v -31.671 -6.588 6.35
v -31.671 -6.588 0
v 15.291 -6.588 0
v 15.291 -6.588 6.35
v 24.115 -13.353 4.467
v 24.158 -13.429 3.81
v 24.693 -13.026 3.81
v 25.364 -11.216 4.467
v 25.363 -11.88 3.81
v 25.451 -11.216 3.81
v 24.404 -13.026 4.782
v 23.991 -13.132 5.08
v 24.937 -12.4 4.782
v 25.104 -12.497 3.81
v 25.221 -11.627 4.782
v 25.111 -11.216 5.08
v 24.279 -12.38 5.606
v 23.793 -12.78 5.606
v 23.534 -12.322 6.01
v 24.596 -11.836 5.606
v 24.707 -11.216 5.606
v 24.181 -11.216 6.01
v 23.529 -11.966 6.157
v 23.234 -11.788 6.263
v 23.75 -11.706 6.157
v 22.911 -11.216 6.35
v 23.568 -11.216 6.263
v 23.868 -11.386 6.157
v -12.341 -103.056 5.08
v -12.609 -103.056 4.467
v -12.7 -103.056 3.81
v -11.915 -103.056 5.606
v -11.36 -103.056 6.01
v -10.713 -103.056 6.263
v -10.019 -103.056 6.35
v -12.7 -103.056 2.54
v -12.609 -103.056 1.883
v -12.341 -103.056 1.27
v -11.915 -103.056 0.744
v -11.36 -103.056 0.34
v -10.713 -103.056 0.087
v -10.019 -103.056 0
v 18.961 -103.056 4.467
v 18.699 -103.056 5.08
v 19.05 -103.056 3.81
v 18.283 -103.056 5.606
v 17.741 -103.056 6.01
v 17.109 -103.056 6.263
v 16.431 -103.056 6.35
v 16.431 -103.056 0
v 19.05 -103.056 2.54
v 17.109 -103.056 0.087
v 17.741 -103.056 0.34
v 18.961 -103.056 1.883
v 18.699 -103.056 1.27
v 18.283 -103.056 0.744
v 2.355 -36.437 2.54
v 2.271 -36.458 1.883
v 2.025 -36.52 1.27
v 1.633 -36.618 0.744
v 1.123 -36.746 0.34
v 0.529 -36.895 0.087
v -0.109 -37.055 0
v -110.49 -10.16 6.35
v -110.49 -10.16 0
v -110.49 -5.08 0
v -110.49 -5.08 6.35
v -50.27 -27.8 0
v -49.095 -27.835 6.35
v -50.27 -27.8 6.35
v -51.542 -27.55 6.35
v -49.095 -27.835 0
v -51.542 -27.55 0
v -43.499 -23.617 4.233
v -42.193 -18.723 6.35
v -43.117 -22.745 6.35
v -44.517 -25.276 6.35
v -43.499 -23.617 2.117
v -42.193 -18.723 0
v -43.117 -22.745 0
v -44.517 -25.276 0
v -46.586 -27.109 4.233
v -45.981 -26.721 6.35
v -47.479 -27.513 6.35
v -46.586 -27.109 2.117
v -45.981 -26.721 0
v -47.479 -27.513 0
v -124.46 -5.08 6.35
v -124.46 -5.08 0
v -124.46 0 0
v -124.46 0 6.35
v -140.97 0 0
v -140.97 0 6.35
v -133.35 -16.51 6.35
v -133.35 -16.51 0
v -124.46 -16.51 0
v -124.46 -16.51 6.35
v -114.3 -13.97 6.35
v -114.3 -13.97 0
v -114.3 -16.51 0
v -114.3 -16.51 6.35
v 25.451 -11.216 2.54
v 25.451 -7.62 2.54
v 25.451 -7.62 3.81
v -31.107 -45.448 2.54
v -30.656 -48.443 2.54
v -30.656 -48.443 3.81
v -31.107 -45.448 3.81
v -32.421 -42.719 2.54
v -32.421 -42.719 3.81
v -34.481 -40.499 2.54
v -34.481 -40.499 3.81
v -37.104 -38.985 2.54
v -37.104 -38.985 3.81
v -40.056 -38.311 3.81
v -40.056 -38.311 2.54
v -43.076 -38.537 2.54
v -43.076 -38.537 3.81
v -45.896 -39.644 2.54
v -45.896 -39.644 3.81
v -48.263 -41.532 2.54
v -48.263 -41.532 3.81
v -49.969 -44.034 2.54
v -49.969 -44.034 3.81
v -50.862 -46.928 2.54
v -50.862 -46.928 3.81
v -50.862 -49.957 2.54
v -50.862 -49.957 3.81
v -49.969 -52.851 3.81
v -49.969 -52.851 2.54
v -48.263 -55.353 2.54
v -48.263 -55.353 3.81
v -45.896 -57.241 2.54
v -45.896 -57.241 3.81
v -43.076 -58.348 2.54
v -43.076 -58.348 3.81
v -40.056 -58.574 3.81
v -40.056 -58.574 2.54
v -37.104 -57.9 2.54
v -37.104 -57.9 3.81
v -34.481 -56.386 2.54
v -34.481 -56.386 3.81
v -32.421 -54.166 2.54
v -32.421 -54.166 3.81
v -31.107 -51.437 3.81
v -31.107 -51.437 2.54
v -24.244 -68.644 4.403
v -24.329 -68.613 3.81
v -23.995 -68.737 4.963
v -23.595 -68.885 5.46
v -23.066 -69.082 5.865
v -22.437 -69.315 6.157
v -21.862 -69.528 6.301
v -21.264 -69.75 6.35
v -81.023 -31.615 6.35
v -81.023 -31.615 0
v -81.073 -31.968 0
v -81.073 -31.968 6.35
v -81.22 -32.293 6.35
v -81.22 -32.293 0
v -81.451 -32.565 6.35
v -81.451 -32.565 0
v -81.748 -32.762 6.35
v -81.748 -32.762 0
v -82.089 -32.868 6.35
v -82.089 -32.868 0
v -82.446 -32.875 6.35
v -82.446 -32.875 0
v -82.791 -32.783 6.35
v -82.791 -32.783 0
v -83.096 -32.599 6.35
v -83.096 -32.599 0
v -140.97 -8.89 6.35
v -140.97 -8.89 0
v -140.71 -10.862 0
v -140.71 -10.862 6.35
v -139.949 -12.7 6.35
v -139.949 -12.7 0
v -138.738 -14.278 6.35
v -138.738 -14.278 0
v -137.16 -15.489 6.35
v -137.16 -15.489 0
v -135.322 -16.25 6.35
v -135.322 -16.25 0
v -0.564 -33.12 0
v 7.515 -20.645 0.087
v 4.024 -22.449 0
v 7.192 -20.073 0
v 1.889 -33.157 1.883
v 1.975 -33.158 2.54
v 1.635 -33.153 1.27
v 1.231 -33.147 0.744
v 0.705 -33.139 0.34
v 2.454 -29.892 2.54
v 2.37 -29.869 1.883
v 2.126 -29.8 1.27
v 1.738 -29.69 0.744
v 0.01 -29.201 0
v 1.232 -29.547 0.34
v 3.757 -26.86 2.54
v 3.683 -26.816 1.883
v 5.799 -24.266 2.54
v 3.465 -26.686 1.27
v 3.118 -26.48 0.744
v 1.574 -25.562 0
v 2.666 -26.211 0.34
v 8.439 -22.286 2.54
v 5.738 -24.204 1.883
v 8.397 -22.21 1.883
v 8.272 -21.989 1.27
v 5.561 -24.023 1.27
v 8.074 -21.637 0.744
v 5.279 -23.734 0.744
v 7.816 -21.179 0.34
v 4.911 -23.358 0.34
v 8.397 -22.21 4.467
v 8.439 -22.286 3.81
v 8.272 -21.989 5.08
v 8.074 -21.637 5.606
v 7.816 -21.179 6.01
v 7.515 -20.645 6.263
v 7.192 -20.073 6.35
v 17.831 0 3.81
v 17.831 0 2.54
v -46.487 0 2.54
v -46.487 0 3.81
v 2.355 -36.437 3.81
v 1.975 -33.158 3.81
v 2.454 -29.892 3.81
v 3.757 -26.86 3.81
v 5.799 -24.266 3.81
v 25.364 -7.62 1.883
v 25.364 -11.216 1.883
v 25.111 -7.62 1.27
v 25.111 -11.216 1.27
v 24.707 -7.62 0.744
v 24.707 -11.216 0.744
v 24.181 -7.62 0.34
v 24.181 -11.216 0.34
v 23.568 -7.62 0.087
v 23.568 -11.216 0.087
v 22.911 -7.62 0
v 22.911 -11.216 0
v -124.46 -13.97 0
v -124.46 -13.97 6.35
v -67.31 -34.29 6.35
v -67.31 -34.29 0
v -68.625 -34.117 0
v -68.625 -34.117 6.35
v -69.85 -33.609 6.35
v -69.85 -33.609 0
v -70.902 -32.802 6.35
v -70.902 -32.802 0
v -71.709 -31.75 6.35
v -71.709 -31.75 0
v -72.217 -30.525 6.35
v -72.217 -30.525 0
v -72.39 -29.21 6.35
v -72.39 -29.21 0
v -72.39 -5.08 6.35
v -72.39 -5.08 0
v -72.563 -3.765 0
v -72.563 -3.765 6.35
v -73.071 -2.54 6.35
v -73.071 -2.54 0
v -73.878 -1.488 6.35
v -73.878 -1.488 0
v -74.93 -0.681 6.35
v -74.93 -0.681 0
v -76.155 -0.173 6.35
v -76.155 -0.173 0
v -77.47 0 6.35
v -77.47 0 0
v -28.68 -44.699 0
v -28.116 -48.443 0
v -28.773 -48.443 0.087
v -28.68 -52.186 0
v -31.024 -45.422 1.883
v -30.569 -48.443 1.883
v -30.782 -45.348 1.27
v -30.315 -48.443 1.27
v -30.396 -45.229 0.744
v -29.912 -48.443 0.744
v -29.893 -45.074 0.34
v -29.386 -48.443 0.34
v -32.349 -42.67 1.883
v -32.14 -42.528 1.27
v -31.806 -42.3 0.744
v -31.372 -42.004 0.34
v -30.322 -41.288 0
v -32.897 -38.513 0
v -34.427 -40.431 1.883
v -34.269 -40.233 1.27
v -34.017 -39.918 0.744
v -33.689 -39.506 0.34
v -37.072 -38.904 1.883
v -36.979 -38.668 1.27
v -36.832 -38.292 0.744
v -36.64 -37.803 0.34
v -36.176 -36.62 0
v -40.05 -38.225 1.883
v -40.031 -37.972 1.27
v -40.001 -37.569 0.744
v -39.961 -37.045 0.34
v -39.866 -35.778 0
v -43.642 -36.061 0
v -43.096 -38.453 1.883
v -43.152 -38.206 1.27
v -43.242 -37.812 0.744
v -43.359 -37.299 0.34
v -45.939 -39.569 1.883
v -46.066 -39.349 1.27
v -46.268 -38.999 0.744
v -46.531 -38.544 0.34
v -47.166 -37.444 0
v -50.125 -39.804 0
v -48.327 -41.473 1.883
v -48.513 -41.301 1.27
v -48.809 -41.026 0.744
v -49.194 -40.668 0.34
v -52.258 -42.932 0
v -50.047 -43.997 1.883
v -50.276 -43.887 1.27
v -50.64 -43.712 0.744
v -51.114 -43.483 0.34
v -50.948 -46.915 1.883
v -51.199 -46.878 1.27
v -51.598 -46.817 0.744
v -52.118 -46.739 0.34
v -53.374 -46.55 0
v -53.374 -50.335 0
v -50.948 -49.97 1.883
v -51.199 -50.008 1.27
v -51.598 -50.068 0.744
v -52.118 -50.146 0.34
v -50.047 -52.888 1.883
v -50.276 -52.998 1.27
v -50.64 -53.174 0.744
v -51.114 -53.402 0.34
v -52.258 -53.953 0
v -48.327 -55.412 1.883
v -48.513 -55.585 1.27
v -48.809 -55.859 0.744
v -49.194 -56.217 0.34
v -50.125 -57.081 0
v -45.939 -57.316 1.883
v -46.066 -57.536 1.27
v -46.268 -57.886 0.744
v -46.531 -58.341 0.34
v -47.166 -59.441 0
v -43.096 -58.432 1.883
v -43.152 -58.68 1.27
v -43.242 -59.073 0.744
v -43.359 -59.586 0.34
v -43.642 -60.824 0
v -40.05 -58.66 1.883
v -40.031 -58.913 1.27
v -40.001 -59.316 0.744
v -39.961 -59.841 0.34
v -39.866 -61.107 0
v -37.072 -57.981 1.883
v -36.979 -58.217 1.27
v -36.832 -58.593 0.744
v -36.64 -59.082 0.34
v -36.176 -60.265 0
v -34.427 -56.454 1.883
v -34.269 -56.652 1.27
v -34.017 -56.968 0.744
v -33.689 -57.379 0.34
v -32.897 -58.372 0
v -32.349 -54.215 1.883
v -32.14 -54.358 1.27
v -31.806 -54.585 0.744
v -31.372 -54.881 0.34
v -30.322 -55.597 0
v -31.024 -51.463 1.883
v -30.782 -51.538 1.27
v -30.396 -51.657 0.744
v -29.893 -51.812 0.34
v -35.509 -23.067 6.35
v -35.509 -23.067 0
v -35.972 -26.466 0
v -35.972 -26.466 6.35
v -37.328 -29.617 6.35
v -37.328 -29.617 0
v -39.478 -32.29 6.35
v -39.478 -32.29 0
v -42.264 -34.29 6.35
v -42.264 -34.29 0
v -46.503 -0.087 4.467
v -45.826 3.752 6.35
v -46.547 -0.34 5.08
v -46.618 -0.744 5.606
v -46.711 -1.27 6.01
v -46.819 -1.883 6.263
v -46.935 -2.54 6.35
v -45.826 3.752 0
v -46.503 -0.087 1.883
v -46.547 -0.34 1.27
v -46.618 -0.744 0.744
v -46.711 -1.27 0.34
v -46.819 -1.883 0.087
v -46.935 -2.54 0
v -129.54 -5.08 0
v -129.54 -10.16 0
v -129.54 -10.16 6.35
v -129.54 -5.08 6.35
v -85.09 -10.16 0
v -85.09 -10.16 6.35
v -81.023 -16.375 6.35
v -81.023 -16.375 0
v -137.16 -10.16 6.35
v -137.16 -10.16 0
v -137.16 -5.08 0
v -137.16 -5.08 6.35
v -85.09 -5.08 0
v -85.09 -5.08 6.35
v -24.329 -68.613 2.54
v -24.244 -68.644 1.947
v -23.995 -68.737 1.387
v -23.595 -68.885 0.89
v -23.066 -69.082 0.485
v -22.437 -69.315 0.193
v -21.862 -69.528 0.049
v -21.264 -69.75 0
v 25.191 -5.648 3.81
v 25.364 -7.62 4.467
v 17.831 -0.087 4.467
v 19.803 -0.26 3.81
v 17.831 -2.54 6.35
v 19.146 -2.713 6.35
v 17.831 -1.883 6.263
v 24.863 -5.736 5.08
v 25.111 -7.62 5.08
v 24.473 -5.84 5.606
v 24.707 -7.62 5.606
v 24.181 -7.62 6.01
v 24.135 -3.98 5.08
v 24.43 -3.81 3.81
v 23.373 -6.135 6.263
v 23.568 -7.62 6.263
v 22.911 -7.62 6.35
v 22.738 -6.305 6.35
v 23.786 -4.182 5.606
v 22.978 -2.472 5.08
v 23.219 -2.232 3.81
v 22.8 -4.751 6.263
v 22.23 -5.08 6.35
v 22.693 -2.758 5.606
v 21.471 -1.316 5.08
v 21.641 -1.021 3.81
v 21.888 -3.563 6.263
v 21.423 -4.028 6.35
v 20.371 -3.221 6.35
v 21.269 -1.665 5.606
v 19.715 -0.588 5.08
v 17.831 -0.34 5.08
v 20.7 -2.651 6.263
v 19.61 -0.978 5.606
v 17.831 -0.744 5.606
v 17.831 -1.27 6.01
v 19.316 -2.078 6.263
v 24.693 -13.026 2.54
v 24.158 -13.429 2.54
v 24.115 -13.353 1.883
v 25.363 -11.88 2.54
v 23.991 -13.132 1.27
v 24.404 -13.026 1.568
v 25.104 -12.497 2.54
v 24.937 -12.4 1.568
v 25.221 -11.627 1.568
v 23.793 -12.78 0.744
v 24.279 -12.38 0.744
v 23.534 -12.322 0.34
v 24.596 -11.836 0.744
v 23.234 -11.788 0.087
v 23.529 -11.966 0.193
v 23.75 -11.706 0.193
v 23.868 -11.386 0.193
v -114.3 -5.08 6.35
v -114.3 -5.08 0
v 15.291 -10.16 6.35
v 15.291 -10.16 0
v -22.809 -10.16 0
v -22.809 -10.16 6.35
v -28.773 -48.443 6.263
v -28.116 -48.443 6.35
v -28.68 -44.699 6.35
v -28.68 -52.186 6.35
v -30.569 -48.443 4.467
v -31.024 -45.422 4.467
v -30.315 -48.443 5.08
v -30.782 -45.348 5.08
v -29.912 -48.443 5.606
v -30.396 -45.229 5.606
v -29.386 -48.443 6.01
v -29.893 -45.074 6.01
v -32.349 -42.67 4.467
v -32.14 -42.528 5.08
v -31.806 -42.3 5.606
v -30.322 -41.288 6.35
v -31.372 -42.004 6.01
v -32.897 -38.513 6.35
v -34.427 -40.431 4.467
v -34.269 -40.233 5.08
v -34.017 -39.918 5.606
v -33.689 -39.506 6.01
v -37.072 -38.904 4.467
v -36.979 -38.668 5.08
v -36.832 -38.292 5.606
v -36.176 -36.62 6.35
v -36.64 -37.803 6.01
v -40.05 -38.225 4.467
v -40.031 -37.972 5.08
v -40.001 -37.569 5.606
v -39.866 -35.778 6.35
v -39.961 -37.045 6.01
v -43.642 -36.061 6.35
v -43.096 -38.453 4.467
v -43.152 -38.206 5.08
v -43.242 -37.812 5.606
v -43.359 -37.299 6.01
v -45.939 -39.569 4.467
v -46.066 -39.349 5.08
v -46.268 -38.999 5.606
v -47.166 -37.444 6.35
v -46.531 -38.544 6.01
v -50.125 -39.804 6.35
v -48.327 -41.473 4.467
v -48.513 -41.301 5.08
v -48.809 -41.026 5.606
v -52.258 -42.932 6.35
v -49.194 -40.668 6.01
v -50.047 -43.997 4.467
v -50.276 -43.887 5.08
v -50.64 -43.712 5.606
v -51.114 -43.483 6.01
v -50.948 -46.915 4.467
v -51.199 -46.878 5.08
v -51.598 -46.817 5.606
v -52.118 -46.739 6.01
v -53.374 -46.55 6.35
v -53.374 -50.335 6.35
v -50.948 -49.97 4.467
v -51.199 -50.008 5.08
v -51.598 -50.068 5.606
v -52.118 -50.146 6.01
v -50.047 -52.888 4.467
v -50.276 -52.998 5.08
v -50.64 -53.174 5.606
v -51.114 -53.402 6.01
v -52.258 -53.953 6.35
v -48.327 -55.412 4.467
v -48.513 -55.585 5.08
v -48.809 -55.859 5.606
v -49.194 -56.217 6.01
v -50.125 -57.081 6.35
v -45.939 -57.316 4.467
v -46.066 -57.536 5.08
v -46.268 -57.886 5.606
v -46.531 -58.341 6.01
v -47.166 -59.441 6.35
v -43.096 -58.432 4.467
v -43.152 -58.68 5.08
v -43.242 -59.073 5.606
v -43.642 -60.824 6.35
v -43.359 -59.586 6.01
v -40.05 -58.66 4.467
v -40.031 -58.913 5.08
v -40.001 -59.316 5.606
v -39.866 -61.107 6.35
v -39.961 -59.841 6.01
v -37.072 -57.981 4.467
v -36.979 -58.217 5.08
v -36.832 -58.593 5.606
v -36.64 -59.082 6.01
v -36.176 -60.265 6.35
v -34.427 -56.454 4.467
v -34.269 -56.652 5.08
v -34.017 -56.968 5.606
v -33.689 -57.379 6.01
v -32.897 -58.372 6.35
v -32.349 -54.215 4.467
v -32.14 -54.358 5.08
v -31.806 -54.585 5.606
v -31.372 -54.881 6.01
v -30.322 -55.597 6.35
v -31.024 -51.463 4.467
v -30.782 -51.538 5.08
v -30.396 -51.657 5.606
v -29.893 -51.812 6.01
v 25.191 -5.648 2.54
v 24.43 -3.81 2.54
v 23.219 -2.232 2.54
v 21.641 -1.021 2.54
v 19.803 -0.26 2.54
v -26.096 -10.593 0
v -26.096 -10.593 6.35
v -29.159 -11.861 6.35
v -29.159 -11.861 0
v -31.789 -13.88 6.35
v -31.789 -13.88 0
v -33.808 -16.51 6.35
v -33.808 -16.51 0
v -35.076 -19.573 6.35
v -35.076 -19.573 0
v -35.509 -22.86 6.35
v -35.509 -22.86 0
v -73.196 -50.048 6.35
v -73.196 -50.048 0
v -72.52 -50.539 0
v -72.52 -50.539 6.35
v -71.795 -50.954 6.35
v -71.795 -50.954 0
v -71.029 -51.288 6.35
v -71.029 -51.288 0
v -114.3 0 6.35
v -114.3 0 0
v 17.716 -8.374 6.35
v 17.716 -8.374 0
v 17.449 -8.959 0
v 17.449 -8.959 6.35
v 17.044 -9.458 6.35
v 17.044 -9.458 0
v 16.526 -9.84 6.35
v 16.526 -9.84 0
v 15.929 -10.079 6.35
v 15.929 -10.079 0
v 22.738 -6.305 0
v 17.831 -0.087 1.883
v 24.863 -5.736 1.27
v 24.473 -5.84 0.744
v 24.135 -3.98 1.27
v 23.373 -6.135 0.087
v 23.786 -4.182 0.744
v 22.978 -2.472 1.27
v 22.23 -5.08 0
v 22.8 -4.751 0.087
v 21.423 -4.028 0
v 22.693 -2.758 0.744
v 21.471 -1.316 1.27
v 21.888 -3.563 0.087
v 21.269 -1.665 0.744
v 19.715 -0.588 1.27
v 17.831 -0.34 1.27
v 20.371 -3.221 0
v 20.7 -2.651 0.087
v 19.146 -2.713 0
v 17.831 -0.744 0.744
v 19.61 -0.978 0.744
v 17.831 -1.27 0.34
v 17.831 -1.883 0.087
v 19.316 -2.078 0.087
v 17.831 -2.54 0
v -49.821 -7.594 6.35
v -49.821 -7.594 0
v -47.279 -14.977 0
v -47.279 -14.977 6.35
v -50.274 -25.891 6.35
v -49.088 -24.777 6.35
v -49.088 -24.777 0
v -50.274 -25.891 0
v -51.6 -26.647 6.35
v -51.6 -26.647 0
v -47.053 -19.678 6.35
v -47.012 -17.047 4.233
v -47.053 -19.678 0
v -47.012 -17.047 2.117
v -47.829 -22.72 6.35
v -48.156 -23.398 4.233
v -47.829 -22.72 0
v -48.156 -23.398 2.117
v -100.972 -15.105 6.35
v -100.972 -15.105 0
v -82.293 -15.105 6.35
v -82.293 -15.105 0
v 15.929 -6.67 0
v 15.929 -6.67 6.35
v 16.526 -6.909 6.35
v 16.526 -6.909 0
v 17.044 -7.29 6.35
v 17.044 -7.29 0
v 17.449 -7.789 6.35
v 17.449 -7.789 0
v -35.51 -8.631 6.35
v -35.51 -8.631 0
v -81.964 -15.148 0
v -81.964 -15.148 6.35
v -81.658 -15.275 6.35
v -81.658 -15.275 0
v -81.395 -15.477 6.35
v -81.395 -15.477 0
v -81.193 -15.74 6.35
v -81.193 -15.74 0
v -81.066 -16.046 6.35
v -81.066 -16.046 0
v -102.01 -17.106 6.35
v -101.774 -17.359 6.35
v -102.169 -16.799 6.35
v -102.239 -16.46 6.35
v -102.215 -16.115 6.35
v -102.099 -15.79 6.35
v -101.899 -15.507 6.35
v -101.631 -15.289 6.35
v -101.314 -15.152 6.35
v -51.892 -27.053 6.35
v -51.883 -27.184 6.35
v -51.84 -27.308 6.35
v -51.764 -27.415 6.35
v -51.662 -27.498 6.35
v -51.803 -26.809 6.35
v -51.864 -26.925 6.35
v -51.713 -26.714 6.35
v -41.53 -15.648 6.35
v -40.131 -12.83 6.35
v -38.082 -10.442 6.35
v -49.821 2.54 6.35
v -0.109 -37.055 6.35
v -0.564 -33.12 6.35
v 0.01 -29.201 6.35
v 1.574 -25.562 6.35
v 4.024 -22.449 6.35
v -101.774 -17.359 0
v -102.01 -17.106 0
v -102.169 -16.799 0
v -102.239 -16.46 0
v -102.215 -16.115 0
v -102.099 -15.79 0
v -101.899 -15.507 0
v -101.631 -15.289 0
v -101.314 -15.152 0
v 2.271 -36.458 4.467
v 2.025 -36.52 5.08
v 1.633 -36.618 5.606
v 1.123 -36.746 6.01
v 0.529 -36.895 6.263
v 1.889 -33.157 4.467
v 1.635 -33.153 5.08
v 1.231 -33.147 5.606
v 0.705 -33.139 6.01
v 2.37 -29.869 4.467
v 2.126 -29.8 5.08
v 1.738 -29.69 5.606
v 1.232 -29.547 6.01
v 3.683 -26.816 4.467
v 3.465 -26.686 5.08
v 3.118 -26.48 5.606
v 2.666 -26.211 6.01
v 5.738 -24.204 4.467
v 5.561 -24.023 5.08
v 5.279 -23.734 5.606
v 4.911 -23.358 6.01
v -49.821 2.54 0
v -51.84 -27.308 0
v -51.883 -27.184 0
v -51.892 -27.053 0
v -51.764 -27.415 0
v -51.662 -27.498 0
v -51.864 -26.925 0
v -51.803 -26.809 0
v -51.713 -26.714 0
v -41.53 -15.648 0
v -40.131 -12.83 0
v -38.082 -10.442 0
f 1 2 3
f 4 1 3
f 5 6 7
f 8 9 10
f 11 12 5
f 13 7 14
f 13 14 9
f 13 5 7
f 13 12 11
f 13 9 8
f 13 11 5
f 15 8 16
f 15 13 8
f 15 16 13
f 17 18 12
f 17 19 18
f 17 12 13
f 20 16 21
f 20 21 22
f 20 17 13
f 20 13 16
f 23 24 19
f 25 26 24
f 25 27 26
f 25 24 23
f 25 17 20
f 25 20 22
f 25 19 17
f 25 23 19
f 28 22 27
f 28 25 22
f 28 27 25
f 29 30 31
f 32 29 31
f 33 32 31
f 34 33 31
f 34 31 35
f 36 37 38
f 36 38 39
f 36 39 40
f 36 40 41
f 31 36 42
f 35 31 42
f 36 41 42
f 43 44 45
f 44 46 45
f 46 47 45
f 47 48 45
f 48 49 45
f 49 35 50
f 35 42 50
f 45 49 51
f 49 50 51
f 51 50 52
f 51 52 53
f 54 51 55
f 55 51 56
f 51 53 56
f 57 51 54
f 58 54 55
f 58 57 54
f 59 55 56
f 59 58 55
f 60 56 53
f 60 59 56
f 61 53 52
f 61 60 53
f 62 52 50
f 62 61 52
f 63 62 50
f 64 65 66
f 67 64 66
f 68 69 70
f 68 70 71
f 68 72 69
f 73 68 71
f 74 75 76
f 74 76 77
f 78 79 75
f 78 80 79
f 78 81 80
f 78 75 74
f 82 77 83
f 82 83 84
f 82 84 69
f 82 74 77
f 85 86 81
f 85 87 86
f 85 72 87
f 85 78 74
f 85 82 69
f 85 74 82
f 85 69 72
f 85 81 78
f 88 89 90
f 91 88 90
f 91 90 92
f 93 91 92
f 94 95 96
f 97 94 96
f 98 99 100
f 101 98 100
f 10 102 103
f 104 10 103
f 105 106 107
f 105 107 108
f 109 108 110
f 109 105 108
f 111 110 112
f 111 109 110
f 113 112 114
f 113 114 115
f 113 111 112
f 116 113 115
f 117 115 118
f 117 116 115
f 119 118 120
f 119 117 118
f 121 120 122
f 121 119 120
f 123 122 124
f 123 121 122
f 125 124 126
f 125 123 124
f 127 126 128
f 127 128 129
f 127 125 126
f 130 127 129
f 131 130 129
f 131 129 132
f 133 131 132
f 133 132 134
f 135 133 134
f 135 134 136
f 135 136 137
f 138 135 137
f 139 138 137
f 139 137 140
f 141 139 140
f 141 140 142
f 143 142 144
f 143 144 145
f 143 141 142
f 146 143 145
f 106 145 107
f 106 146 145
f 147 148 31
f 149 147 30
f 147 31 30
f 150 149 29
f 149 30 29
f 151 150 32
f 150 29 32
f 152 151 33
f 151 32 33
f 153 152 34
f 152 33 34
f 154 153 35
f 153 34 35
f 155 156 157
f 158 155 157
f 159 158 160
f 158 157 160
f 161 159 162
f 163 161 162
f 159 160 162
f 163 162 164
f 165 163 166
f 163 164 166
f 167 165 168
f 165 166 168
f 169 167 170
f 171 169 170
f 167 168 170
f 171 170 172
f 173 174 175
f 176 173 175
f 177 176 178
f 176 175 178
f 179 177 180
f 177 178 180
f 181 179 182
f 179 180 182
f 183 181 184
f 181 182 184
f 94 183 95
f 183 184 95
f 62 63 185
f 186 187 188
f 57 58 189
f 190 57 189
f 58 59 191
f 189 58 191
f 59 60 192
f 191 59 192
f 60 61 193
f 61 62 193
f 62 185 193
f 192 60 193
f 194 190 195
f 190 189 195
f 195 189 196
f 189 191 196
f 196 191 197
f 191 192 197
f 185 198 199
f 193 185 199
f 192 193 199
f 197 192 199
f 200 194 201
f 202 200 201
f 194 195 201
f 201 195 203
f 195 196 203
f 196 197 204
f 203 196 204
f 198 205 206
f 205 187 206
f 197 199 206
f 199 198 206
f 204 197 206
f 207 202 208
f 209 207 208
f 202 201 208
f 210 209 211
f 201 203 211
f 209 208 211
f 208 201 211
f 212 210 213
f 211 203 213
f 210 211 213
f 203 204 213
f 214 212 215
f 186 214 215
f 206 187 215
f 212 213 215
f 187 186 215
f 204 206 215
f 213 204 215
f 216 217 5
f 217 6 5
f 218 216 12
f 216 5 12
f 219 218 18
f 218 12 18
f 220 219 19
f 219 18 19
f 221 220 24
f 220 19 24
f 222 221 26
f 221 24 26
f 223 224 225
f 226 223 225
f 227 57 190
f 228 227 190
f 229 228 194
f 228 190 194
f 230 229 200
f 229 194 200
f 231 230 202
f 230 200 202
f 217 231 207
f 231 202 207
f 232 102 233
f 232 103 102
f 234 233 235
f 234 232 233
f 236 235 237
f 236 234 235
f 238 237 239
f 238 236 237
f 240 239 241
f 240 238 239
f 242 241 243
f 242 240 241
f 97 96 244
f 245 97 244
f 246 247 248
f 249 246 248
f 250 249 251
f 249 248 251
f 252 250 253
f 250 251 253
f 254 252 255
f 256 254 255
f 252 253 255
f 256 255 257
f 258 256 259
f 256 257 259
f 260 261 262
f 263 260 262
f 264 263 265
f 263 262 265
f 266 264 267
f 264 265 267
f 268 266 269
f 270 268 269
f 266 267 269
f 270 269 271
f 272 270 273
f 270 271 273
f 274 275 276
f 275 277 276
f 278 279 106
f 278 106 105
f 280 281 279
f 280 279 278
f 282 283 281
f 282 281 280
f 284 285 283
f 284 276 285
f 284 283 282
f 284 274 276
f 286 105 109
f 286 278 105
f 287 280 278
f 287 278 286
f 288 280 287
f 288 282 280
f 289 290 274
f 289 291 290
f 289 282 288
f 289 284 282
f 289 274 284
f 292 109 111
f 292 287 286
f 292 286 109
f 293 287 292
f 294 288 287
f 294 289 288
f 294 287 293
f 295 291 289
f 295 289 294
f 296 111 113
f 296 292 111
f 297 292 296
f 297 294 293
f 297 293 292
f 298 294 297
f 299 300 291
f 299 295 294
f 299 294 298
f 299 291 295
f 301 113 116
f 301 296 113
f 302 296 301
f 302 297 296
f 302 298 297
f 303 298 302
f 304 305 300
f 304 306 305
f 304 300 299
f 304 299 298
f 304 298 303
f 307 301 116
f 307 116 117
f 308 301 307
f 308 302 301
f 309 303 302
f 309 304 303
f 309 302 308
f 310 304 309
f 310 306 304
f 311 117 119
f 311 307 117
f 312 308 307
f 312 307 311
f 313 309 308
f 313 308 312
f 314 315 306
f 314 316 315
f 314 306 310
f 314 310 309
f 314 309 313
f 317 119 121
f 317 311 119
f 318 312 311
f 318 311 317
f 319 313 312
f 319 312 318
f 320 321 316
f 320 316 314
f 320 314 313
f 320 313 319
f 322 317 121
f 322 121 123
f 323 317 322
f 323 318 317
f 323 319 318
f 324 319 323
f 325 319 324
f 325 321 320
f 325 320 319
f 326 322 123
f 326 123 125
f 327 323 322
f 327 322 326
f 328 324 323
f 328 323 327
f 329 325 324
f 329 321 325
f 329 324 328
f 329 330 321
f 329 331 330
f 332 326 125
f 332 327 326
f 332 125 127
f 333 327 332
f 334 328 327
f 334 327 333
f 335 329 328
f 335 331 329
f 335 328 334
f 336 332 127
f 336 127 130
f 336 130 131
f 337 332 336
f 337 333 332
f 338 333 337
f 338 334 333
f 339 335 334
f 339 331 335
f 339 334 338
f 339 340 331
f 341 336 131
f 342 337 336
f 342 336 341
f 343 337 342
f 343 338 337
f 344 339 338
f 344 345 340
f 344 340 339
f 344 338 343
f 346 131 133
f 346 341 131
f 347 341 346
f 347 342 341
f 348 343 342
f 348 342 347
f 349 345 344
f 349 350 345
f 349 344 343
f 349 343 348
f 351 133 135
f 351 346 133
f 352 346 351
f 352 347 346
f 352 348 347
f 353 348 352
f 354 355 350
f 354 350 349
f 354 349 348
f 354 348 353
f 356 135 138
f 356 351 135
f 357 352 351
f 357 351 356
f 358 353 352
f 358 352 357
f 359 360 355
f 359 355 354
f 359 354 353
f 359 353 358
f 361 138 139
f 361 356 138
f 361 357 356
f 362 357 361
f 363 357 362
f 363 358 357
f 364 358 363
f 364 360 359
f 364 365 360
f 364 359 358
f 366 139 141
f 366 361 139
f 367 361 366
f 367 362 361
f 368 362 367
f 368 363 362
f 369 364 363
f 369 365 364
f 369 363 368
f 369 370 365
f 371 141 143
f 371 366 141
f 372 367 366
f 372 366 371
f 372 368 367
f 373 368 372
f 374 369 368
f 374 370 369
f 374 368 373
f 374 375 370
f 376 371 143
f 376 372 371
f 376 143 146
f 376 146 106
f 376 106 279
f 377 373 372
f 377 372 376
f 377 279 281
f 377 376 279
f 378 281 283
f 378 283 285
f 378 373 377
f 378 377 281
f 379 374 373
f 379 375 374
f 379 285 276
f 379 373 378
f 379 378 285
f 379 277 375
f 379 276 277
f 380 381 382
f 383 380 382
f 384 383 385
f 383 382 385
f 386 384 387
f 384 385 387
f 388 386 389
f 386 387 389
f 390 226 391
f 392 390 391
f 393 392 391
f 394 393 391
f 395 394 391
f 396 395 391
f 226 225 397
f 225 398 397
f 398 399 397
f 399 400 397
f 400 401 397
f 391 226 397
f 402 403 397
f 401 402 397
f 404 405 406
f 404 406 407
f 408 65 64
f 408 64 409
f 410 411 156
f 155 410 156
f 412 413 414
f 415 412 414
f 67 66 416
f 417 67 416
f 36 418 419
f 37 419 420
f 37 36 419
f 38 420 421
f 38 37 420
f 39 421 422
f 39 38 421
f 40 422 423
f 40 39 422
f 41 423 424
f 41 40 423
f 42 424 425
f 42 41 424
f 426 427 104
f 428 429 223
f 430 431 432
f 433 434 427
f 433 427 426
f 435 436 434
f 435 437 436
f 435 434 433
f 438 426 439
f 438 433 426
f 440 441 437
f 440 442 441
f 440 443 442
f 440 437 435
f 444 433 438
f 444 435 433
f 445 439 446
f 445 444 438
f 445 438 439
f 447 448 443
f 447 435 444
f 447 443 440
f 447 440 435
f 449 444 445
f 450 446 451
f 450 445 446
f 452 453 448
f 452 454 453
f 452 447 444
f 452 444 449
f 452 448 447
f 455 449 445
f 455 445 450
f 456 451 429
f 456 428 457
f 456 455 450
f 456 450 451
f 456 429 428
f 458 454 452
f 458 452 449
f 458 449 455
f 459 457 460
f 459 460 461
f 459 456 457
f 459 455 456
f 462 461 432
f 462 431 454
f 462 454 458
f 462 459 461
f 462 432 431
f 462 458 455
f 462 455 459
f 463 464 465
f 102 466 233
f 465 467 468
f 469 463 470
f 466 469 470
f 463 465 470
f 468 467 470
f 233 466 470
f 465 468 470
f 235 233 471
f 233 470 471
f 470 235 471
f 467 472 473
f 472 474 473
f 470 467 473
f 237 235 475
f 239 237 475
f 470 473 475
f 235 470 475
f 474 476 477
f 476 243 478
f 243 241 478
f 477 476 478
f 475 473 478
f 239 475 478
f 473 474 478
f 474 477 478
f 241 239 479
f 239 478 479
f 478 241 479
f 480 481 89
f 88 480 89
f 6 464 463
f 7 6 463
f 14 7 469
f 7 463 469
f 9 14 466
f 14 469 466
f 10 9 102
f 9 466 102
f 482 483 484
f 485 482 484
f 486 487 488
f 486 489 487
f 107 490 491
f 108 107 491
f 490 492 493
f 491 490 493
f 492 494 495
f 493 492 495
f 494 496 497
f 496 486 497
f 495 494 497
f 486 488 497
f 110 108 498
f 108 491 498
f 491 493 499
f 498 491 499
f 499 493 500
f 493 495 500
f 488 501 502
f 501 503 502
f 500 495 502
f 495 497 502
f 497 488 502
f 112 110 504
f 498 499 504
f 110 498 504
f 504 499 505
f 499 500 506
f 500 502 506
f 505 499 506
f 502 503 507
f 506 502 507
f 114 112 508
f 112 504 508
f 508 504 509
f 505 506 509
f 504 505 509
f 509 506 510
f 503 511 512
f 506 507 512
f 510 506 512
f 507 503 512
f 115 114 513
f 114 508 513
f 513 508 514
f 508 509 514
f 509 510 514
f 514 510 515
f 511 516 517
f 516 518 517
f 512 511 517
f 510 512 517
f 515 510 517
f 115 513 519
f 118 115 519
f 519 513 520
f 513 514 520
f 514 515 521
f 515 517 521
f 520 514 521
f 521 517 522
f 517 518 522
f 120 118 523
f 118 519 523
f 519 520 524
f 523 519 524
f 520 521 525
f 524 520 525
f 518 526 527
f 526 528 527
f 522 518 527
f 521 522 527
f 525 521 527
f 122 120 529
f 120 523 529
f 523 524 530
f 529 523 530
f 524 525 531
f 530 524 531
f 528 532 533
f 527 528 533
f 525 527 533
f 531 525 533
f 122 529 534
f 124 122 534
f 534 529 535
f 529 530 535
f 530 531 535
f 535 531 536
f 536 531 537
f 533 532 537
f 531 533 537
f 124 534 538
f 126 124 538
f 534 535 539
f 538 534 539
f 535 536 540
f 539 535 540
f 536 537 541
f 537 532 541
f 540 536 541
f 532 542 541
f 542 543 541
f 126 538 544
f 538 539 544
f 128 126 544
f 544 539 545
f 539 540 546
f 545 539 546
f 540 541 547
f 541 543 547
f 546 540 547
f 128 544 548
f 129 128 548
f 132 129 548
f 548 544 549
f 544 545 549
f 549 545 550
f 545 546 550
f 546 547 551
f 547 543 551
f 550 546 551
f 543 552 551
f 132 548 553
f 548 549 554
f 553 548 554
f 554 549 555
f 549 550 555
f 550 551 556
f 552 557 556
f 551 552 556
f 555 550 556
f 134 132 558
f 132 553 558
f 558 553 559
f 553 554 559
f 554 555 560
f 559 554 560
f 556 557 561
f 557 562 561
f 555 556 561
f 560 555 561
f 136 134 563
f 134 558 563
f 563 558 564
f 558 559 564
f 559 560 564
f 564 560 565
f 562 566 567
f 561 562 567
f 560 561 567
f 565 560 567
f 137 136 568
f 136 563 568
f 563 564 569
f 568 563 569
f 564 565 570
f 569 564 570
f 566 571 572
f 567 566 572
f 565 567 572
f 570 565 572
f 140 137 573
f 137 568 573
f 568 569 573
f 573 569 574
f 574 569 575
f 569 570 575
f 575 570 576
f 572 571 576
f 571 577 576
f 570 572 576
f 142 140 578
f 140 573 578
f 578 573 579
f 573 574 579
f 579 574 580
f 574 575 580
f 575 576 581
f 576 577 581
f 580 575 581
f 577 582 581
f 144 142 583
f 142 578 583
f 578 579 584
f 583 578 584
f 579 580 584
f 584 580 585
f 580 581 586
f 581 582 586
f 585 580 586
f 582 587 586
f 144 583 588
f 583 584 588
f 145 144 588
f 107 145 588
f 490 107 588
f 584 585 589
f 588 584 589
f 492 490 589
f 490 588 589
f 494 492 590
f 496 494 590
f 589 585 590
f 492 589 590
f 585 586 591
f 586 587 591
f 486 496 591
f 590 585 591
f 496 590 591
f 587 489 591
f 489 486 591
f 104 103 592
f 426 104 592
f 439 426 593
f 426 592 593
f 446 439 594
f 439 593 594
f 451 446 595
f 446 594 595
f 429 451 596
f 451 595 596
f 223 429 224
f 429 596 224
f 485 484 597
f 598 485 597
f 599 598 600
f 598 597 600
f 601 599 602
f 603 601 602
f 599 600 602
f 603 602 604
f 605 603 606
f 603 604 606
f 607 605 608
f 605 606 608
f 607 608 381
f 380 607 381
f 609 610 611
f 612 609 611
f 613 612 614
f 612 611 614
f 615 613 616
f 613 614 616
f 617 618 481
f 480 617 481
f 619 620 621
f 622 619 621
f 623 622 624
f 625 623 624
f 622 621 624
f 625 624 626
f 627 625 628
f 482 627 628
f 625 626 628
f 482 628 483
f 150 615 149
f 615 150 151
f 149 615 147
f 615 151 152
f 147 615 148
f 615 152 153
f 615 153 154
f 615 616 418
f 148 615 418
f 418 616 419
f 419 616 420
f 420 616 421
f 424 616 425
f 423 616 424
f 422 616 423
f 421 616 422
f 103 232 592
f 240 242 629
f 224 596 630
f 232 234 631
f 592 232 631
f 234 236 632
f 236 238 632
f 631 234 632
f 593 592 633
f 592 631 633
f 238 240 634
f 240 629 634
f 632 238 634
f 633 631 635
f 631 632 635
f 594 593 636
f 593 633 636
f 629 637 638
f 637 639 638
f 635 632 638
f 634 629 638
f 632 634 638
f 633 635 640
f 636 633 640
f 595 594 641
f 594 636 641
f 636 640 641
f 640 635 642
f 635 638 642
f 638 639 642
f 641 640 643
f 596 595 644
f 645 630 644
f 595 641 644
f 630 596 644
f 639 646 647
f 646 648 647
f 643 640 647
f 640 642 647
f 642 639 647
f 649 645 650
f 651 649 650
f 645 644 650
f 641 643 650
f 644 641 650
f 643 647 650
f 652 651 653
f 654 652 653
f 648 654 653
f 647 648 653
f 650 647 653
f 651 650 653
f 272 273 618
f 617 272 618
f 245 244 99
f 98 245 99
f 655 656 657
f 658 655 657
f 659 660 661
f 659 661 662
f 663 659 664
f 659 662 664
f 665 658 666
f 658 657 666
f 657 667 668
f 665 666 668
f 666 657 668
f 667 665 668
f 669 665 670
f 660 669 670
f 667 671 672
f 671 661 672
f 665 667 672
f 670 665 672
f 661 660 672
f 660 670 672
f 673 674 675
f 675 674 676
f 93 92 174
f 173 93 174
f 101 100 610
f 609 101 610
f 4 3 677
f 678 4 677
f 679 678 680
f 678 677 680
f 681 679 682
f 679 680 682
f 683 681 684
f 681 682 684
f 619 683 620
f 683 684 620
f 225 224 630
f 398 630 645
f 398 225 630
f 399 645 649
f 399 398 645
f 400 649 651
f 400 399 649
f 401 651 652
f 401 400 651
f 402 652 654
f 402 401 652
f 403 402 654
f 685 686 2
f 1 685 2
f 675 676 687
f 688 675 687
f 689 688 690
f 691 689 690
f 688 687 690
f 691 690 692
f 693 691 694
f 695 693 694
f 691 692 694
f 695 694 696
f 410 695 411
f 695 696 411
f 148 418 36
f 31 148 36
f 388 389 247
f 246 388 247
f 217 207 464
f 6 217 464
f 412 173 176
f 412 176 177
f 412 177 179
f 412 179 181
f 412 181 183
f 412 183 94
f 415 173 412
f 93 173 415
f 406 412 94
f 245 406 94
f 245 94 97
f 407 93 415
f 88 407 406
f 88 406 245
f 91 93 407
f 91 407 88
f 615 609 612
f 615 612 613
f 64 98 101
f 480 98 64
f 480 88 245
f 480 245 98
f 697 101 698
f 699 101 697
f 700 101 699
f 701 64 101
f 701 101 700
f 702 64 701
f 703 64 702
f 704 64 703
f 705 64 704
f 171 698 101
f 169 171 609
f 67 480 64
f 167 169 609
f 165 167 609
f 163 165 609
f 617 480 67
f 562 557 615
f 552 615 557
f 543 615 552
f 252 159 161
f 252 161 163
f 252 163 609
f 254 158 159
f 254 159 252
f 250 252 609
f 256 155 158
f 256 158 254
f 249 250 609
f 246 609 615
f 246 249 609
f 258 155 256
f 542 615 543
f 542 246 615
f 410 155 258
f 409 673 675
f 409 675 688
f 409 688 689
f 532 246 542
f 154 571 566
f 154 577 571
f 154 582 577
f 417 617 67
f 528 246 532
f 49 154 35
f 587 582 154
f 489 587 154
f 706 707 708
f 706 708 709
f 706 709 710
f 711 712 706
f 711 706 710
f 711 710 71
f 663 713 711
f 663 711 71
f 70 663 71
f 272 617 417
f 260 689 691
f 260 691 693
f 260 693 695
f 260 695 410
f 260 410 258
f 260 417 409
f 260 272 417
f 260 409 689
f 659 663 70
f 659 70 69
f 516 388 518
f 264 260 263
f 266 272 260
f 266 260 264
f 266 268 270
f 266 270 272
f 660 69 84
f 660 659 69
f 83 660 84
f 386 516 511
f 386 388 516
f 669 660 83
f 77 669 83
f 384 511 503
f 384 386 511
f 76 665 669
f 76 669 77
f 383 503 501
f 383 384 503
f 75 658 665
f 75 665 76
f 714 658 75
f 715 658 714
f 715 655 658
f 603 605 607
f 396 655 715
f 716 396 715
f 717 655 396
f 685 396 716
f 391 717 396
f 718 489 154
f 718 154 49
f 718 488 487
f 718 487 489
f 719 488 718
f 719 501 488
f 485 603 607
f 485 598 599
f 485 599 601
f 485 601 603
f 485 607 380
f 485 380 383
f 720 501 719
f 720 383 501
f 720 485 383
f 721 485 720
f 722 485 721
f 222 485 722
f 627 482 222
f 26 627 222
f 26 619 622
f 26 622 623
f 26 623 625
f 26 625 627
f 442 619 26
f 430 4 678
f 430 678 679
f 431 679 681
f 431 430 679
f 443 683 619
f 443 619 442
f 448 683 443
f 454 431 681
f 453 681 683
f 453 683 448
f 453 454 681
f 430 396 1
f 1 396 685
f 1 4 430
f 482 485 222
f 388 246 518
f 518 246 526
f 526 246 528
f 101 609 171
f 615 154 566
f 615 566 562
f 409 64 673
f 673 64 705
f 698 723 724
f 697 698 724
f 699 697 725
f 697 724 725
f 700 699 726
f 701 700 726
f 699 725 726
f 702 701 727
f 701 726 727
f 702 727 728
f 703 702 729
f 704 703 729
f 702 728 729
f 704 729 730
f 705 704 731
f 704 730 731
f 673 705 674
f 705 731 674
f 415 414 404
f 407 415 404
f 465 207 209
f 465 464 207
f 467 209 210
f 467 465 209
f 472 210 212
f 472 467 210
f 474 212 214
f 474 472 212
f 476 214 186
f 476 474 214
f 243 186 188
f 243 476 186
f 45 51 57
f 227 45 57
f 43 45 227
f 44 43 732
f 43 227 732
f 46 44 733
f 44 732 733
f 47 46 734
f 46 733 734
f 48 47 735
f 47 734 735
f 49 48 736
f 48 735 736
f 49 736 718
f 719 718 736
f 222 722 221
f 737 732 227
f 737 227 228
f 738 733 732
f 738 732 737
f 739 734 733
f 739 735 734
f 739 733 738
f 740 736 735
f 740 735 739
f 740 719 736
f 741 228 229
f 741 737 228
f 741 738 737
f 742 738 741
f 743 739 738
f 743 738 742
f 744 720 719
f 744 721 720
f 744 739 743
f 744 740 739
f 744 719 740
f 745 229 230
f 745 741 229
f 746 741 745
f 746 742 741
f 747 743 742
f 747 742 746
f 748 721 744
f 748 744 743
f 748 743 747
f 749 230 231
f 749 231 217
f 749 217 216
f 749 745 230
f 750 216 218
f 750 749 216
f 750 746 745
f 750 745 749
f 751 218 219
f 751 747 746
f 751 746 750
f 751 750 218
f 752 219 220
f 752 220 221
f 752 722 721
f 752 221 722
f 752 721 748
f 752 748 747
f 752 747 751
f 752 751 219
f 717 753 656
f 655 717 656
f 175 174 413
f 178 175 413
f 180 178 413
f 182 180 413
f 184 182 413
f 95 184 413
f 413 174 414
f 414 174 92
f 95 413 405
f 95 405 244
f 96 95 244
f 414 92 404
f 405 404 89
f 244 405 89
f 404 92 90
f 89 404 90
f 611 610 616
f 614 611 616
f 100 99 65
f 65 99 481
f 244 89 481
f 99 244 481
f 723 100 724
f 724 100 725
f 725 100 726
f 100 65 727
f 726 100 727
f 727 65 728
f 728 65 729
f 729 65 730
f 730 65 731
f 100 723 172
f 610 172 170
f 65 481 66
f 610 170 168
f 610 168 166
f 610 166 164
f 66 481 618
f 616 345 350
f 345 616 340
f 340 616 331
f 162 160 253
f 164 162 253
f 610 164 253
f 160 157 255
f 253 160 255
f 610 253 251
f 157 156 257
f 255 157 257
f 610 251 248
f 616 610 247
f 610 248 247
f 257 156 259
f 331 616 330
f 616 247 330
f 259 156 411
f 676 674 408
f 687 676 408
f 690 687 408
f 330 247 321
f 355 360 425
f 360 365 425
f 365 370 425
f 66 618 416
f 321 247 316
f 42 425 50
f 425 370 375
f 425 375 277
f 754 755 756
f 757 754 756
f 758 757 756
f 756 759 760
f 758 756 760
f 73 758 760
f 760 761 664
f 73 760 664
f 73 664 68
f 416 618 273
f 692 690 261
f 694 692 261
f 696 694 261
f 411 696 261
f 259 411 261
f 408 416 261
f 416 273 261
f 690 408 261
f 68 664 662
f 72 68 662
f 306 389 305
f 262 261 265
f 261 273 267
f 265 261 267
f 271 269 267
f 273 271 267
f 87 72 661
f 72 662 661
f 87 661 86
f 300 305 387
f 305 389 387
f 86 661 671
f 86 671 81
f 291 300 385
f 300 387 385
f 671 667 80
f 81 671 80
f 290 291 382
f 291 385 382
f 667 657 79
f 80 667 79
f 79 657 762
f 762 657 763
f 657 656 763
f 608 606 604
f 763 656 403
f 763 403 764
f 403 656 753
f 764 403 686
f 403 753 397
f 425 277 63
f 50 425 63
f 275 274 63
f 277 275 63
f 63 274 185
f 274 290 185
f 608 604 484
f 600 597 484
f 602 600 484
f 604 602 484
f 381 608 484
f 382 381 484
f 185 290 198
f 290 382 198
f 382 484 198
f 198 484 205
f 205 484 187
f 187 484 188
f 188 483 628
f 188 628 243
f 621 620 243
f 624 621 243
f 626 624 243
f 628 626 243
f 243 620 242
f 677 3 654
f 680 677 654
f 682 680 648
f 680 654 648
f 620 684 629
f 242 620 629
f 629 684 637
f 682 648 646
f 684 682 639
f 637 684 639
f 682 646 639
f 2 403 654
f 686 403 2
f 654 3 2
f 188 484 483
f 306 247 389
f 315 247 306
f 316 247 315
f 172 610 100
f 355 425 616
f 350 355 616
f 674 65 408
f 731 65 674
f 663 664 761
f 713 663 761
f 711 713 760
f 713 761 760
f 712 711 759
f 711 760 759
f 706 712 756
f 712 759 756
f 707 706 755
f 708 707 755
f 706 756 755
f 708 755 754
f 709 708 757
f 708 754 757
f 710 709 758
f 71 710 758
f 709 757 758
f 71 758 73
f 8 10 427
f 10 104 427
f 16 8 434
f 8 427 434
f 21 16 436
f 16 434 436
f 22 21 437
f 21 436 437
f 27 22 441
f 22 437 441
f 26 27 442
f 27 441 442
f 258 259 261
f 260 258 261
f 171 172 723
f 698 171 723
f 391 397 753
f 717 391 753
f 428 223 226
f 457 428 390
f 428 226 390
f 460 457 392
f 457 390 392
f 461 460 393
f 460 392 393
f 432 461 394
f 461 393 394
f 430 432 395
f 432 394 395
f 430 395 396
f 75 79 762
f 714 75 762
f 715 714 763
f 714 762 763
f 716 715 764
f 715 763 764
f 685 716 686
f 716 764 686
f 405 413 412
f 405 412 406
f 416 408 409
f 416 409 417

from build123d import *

# Parameters (mm, degrees)
F0_W     = 7.62
F0_H     = 5.08
F0_W_2   = 25.4
F0_R     = 10.16
F1_DEPTH = 6.35
F2_R     = 2.54


with BuildPart() as f1:
    # F0 (on Top) → F1 (new body)
    with BuildSketch(Plane.XY):
        with BuildLine():
            Line((-31.6706262529, -6.5881243579), (15.2908454792, -6.5881243579))
            ThreePointArc((15.2908454792, -6.5881243579), (16.7968803502, -7.0827737847), (17.7163331065, -8.374062179))
            ThreePointArc((17.7163331065, -8.374062179), (16.7968803502, -9.6653505732), (15.2908454792, -10.16))
            Line((15.2908454792, -10.16), (-22.8091545208, -10.16))
            ThreePointArc((-22.8091545208, -10.16), (-31.7894106419, -13.8797438789), (-35.5091545208, -22.86))
            Line((-35.5091545208, -22.86), (-35.5091545208, -23.067451765))
            ThreePointArc((-35.5091545208, -23.067451765), (-37.3281393906, -29.6167654494), (-42.2640379439, -34.29))
            Line((-42.2640379439, -34.29), (-67.31, -34.29))
            ThreePointArc((-67.31, -34.29), (-70.9021024484, -32.8021024484), (-72.39, -29.21))
            Line((-72.39, -29.21), (-72.39, -5.08))
            ThreePointArc((-72.39, -5.08), (-73.8778975516, -1.4878975516), (-77.47, 0))
            Line((-77.47, 0), (-114.3, 0))
            Line((-114.3, 0), (-114.3, -5.08))
            Line((-114.3, -5.08), (-124.46, -5.08))
            Line((-124.46, -5.08), (-124.46, 0))
            Line((-124.46, 0), (-140.97, 0))
            Line((-140.97, 0), (-140.97, -8.89))
            ThreePointArc((-140.97, -8.89), (-138.7381536726, -14.2781536726), (-133.35, -16.51))
            Line((-133.35, -16.51), (-124.46, -16.51))
            Line((-124.46, -16.51), (-124.46, -13.97))
            Line((-124.46, -13.97), (-114.3, -13.97))
            Line((-114.3, -13.97), (-114.3, -16.51))
            Line((-114.3, -16.51), (-73.1955929906, -50.0475420508))
            ThreePointArc((-73.1955929906, -50.0475420508), (-72.1633213981, -50.756926583), (-71.0287858488, -51.2876243715))
            Line((-71.0287858488, -51.2876243715), (-24.3288669735, -68.6128414369))
            Line((-24.3288669735, -68.6128414369), (-12.7, -103.0557602644))
            Line((-12.7, -103.0557602644), (19.05, -103.0557602644))
            Line((19.05, -103.0557602644), (2.3547967276, -36.4372610145))
            ThreePointArc((2.3547967276, -36.4372610145), (3.0065319132, -28.3336286948), (8.4393105622, -22.2856098724))
            Line((8.4393105622, -22.2856098724), (24.1577511408, -13.4286290107))
            ThreePointArc((24.1577511408, -13.4286290107), (25.1038731102, -12.4972467832), (25.4508454792, -11.2157516369))
            Line((25.4508454792, -11.2157516369), (25.4508454792, -7.62))
            ThreePointArc((25.4508454792, -7.62), (23.2189991518, -2.2318463274), (17.8308454792, 0))
            Line((17.8308454792, 0), (12.0385419577, 0))
            Line((12.0385419577, 0), (-46.4872904122, 0))
            Line((-46.4872904122, 0), (-45.8256908553, 3.752117539))
            Line((-45.8256908553, 3.752117539), (-49.8210415244, 2.54))
            Line((-49.8210415244, 2.54), (-49.8210415244, 0))
            Line((-49.8210415244, 0), (-49.8210415244, -7.5935418718))
            add(Edge.make_bspline(
                [(-49.8210415244, -7.5935418718), (-44.485431179, -18.5982405148), (-47.5559489311, -24.9495477887), (-51.5999285014, -26.6474626741)],
                knots=[0, 0, 0, 0, 17.7354547772, 17.7354547772, 17.7354547772, 17.7354547772], degree=3))
            ThreePointArc((-51.5999285014, -26.6474626741), (-51.8920952454, -27.1191706564), (-51.5419420272, -27.5495920205))
            add(Edge.make_bspline(
                [(-42.1931219537, -18.7228273079), (-42.6397200116, -23.7693324215), (-45.6204470158, -29.1828876463), (-51.5419420272, -27.5495920205)],
                knots=[5.2109253832, 5.2109253832, 5.2109253832, 5.2109253832, 16.5043202027, 16.5043202027, 16.5043202027, 16.5043202027], degree=3))
            ThreePointArc((-42.1931219537, -18.7228273079), (-40.130905812, -12.8297269732), (-35.5096463796, -8.6314739761))
            Line((-35.5096463796, -8.6314739761), (-31.6706262529, -6.5881243579))
        make_face()
        with BuildLine():
            Line((-83.0959535938, -32.5987200656), (-101.7744590691, -17.3587200656))
            ThreePointArc((-101.7744590691, -17.3587200656), (-102.1679568897, -15.9485577312), (-100.9715862663, -15.1047001153))
            Line((-100.9715862663, -15.1047001153), (-82.2930807911, -15.1047001153))
            ThreePointArc((-82.2930807911, -15.1047001153), (-81.3950551789, -15.4766745032), (-81.0230807911, -16.3747001153))
            Line((-81.0230807911, -16.3747001153), (-81.0230807911, -31.6147001153))
            ThreePointArc((-81.0230807911, -31.6147001153), (-81.74844718, -32.7619900655), (-83.0959535938, -32.5987200656))
        make_face(mode=Mode.SUBTRACT)
        with Locations((-133.35, -7.62)):
            Rectangle(F0_W, F0_H, mode=Mode.SUBTRACT)
        with Locations((-97.79, -7.62)):
            Rectangle(F0_W_2, F0_H, mode=Mode.SUBTRACT)
        with Locations((-40.8155657351, -48.4425649047)):
            Circle(F0_R, mode=Mode.SUBTRACT)
        with BuildLine():
            ThreePointArc((17.8308454792, -9.1281243579), (17.8020542094, -8.7467705677), (17.7163331065, -8.374062179))
            ThreePointArc((17.7163331065, -8.374062179), (17.8020542094, -8.0013537902), (17.8308454792, -7.62))
            Line((17.8308454792, -7.62), (17.8308454792, -9.1281243579))
        make_face(mode=Mode.SUBTRACT)
        with BuildLine():
            ThreePointArc((17.8308454792, -7.62), (17.8020542094, -8.0013537902), (17.7163331065, -8.374062179))
            ThreePointArc((17.7163331065, -8.374062179), (17.8020542094, -8.7467705677), (17.8308454792, -9.1281243579))
            Line((17.8308454792, -9.1281243579), (17.8308454792, -7.62))
        make_face()
    extrude(amount=F1_DEPTH)

    # F2
    f2_edges = [f1.edges().sort_by_distance(p)[0] for p in [
        (-18.514433, -85.834301, 6.35),
        (-18.514433, -85.834301, 0),
        (-50.975566, -48.442565, 6.35),
        (-50.975566, -48.442565, 0),
        (10.702398, -69.746511, 6.35),
        (10.702398, -69.746511, 0),
        (3.006532, -28.333629, 0),
        (3.006532, -28.333629, 6.35),
        (16.298531, -17.857119, 0),
        (16.298531, -17.857119, 6.35),
        (25.103873, -12.497247, 0),
        (25.103873, -12.497247, 6.35),
        (25.450845, -9.417876, 0),
        (25.450845, -9.417876, 6.35),
        (23.218999, -2.231846, 0),
        (23.218999, -2.231846, 6.35),
        (-14.328222, 0, 0),
        (-14.328222, 0, 6.35),
    ]]
    fillet(f2_edges, radius=F2_R)


solid = f1.part
